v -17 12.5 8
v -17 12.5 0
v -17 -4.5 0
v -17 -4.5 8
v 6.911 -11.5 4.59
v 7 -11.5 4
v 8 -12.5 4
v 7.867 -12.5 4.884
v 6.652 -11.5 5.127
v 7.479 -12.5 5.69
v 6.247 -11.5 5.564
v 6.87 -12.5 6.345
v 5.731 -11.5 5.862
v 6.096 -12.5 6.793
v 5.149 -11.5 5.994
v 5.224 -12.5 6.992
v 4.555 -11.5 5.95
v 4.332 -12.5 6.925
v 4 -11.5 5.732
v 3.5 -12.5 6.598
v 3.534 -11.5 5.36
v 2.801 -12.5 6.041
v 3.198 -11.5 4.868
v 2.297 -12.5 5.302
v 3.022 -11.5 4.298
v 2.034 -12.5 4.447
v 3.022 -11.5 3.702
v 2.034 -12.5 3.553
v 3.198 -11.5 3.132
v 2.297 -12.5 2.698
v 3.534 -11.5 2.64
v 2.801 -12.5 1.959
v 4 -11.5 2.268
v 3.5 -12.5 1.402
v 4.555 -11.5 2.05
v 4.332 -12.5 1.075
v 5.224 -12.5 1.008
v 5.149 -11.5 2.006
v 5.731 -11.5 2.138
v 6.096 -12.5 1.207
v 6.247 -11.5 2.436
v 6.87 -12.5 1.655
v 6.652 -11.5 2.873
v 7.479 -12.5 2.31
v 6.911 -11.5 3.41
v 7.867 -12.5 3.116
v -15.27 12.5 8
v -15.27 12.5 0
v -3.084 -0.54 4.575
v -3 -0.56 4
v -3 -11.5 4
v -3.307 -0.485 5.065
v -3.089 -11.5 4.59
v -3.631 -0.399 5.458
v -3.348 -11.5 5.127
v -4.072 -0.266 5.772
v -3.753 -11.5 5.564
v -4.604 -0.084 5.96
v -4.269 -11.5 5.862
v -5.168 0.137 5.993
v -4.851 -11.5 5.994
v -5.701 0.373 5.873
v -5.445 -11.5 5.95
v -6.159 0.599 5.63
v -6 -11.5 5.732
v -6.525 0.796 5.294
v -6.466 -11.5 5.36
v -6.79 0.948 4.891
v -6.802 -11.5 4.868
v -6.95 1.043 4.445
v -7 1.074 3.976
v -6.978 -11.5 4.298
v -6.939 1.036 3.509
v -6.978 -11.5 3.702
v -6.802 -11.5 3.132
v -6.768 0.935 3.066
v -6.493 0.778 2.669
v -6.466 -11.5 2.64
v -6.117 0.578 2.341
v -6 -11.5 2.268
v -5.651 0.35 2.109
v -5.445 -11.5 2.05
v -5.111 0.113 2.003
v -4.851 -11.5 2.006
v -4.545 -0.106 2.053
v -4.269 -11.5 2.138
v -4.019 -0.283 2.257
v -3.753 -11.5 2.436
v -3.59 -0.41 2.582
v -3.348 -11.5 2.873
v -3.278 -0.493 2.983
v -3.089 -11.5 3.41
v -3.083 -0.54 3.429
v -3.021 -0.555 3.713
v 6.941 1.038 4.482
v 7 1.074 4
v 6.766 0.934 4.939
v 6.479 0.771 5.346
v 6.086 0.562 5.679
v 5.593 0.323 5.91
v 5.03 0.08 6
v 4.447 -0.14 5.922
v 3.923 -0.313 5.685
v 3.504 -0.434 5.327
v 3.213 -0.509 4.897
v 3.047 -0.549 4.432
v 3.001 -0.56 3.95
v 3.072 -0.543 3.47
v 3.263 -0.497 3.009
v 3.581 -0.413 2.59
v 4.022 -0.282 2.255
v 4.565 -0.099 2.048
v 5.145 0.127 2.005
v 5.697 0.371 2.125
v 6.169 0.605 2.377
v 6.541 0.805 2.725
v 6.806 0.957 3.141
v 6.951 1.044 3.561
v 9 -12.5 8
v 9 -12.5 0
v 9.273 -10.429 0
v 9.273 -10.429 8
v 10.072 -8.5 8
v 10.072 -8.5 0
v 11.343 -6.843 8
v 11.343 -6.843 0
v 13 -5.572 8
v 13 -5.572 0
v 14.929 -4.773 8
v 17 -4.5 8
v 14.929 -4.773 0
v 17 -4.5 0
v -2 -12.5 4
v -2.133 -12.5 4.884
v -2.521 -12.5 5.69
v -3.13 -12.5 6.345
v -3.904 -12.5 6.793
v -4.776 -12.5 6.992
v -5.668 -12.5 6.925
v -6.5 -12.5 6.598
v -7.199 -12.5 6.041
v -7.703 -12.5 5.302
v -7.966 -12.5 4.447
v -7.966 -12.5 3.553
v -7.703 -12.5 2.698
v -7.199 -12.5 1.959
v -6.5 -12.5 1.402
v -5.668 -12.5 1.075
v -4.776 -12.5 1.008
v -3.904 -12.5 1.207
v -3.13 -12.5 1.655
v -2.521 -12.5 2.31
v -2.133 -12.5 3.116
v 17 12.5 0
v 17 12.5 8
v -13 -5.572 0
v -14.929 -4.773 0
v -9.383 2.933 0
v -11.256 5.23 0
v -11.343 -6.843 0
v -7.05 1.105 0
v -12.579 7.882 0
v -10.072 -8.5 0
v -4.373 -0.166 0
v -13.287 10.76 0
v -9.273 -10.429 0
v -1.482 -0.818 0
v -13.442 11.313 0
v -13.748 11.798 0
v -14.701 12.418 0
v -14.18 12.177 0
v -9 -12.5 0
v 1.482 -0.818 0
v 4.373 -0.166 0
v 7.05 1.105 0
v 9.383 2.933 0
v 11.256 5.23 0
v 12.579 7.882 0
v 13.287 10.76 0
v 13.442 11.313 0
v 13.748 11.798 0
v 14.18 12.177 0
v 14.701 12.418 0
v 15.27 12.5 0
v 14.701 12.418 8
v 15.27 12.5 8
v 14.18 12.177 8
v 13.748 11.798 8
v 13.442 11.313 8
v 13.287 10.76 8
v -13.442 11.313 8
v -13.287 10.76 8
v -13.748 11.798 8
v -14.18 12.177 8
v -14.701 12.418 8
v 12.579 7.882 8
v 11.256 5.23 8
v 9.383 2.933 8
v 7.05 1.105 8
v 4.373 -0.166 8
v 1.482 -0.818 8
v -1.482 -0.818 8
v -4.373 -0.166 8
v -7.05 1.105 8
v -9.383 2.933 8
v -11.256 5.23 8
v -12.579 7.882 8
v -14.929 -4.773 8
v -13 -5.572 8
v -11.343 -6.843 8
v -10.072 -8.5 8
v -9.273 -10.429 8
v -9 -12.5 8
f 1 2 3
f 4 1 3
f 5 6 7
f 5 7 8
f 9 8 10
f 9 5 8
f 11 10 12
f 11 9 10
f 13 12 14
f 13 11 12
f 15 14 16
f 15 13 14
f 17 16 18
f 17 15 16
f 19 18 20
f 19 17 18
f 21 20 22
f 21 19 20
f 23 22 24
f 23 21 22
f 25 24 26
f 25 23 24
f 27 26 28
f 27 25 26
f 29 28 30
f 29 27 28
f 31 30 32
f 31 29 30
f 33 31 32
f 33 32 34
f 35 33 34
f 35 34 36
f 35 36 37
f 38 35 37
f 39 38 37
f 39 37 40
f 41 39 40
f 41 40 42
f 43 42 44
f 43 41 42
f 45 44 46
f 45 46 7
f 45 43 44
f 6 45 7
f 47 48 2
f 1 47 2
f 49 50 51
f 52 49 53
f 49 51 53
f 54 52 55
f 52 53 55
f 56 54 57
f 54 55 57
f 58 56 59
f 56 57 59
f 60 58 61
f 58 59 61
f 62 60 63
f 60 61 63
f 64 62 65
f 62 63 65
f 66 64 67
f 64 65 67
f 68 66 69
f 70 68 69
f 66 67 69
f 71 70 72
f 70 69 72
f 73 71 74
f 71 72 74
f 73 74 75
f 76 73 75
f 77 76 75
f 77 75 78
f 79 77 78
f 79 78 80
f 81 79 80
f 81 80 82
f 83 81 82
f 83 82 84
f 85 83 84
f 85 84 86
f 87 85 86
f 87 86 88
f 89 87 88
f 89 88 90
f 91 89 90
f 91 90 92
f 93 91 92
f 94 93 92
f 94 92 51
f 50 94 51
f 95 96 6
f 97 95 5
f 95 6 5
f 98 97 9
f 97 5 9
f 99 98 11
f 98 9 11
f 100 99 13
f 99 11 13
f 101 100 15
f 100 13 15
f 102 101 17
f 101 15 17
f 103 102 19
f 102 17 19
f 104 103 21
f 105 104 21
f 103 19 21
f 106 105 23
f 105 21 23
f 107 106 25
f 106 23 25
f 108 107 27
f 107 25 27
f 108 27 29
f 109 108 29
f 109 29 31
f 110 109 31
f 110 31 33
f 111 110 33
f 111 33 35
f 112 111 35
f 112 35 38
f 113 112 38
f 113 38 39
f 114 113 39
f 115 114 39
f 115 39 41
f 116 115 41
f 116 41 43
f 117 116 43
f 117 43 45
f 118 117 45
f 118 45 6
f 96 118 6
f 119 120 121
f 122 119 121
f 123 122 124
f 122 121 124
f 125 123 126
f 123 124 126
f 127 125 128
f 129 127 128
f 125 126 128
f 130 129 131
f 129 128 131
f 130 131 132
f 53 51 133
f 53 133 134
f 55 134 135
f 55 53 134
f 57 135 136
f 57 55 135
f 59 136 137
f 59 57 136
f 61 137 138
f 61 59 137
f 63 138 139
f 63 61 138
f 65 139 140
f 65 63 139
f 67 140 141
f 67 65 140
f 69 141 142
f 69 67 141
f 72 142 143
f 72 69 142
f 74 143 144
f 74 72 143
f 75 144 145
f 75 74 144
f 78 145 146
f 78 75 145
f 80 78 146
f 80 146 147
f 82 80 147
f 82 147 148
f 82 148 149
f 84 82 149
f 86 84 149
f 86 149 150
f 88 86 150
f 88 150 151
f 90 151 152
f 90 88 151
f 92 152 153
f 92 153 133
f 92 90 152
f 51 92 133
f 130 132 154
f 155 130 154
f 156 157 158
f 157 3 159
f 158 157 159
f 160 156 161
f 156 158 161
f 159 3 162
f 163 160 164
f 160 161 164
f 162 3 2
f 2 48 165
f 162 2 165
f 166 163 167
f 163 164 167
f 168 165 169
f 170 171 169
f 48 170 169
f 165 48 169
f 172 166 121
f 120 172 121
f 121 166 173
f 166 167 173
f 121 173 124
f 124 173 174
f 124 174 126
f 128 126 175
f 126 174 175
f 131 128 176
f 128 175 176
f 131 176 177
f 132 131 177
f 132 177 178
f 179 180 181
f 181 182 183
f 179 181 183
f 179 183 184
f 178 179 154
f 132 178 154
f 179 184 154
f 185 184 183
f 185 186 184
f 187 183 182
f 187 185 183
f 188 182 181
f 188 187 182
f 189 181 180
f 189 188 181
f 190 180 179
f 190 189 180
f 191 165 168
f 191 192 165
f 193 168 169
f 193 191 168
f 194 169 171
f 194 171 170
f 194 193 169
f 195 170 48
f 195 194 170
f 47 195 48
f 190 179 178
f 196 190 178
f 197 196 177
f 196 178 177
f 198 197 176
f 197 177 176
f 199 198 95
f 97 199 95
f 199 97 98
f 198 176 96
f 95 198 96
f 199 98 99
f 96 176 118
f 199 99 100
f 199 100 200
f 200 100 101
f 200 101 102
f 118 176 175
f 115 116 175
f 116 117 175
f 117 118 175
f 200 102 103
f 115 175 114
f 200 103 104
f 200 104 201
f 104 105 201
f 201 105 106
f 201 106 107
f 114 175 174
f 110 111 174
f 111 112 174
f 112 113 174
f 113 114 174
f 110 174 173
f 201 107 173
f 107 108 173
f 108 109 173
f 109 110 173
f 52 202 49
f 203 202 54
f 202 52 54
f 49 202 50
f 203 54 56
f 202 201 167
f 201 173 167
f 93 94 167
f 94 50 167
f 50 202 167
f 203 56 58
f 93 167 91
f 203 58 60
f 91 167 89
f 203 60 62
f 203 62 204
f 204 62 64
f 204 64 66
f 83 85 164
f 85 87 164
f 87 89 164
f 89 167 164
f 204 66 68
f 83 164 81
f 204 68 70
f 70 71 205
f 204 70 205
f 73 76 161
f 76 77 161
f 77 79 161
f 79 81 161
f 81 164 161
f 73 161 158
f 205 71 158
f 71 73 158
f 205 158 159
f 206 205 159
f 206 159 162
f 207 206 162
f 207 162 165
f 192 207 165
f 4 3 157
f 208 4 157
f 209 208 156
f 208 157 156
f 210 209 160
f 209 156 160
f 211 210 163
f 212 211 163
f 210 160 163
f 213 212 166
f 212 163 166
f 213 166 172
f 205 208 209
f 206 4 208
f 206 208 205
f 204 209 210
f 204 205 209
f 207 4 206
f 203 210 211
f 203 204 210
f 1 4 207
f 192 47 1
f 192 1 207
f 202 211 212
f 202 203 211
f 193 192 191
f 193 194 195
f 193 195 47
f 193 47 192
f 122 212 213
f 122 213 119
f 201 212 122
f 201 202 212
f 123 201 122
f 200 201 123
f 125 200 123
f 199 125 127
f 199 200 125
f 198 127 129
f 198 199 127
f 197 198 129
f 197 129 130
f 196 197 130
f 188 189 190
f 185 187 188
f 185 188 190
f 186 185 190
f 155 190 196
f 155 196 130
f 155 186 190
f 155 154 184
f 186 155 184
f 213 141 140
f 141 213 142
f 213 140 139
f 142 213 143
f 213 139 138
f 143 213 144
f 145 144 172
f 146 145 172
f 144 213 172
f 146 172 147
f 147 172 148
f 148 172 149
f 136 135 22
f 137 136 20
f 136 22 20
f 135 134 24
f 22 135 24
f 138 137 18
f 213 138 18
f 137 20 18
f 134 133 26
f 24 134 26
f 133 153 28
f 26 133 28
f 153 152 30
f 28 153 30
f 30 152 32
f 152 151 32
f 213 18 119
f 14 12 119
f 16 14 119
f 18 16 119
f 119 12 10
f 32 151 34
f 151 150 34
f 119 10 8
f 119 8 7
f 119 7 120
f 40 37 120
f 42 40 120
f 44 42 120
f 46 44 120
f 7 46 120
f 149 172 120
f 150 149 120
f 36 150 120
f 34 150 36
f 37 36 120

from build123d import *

# Parameters (mm, degrees)
BOSS_EXTRU_1_DEPTH      = 8
ENL_V_MAT_EXTRU_1_REACH = 27
ESQUISSE2_R             = 2
CHANFREIN1_SIZE         = 1
CONG_1_R                = 2


with BuildPart() as part:
    # Esquisse1 → Boss.-Extru.1 (new body)
    with BuildSketch(Plane.XY):
        with BuildLine():
            Line((-17, 12.5), (-17, -4.5))
            ThreePointArc((-17, -4.5), (-11.343145751, -6.843145751), (-9, -12.5))
            Line((-9, -12.5), (9, -12.5))
            ThreePointArc((9, -12.5), (11.343145751, -6.843145751), (17, -4.5))
            Line((17, -4.5), (17, 12.5))
            Line((17, 12.5), (13.4, 12.5))
            ThreePointArc((13.4, 12.5), (0, -0.9), (-13.4, 12.5))
            Line((-13.4, 12.5), (-17, 12.5))
        make_face()
    extrude(amount=BOSS_EXTRU_1_DEPTH)

    # Esquisse2 → Enlèv. mat.-Extru.1 (cut, up to next)
    with BuildSketch(Plane.XZ.offset(12.5), mode=Mode.PRIVATE) as enl_v_mat_extru_1_sk1:
        with Locations((-5, 4)):
            Circle(ESQUISSE2_R)
    enl_v_mat_extru_1_tool1 = extrude(enl_v_mat_extru_1_sk1.sketch, amount=-ENL_V_MAT_EXTRU_1_REACH, mode=Mode.PRIVATE) & part.part
    add(enl_v_mat_extru_1_tool1.solids().sort_by_distance((-5, -12.5, 4))[0], mode=Mode.SUBTRACT)
    # Esquisse2 → Enlèv. mat.-Extru.1 (cut, up to next)
    with BuildSketch(Plane.XZ.offset(12.5), mode=Mode.PRIVATE) as enl_v_mat_extru_1_sk2:
        with Locations((5, 4)):
            Circle(ESQUISSE2_R)
    enl_v_mat_extru_1_tool2 = extrude(enl_v_mat_extru_1_sk2.sketch, amount=-ENL_V_MAT_EXTRU_1_REACH, mode=Mode.PRIVATE) & part.part
    add(enl_v_mat_extru_1_tool2.solids().sort_by_distance((5, -12.5, 4))[0], mode=Mode.SUBTRACT)

    # Chanfrein1
    chanfrein1_edges = [part.edges().sort_by_distance(p)[0] for p in [
        (-7, -12.5, 4),
        (3, -12.5, 4),
    ]]
    chamfer(chanfrein1_edges, length=CHANFREIN1_SIZE)

    # Congé1
    cong_1_edges = [part.edges().sort_by_distance(p)[0] for p in [
        (-13.4, 12.5, 4),
        (13.4, 12.5, 4),
    ]]
    fillet(cong_1_edges, radius=CONG_1_R)


solid = part.part
